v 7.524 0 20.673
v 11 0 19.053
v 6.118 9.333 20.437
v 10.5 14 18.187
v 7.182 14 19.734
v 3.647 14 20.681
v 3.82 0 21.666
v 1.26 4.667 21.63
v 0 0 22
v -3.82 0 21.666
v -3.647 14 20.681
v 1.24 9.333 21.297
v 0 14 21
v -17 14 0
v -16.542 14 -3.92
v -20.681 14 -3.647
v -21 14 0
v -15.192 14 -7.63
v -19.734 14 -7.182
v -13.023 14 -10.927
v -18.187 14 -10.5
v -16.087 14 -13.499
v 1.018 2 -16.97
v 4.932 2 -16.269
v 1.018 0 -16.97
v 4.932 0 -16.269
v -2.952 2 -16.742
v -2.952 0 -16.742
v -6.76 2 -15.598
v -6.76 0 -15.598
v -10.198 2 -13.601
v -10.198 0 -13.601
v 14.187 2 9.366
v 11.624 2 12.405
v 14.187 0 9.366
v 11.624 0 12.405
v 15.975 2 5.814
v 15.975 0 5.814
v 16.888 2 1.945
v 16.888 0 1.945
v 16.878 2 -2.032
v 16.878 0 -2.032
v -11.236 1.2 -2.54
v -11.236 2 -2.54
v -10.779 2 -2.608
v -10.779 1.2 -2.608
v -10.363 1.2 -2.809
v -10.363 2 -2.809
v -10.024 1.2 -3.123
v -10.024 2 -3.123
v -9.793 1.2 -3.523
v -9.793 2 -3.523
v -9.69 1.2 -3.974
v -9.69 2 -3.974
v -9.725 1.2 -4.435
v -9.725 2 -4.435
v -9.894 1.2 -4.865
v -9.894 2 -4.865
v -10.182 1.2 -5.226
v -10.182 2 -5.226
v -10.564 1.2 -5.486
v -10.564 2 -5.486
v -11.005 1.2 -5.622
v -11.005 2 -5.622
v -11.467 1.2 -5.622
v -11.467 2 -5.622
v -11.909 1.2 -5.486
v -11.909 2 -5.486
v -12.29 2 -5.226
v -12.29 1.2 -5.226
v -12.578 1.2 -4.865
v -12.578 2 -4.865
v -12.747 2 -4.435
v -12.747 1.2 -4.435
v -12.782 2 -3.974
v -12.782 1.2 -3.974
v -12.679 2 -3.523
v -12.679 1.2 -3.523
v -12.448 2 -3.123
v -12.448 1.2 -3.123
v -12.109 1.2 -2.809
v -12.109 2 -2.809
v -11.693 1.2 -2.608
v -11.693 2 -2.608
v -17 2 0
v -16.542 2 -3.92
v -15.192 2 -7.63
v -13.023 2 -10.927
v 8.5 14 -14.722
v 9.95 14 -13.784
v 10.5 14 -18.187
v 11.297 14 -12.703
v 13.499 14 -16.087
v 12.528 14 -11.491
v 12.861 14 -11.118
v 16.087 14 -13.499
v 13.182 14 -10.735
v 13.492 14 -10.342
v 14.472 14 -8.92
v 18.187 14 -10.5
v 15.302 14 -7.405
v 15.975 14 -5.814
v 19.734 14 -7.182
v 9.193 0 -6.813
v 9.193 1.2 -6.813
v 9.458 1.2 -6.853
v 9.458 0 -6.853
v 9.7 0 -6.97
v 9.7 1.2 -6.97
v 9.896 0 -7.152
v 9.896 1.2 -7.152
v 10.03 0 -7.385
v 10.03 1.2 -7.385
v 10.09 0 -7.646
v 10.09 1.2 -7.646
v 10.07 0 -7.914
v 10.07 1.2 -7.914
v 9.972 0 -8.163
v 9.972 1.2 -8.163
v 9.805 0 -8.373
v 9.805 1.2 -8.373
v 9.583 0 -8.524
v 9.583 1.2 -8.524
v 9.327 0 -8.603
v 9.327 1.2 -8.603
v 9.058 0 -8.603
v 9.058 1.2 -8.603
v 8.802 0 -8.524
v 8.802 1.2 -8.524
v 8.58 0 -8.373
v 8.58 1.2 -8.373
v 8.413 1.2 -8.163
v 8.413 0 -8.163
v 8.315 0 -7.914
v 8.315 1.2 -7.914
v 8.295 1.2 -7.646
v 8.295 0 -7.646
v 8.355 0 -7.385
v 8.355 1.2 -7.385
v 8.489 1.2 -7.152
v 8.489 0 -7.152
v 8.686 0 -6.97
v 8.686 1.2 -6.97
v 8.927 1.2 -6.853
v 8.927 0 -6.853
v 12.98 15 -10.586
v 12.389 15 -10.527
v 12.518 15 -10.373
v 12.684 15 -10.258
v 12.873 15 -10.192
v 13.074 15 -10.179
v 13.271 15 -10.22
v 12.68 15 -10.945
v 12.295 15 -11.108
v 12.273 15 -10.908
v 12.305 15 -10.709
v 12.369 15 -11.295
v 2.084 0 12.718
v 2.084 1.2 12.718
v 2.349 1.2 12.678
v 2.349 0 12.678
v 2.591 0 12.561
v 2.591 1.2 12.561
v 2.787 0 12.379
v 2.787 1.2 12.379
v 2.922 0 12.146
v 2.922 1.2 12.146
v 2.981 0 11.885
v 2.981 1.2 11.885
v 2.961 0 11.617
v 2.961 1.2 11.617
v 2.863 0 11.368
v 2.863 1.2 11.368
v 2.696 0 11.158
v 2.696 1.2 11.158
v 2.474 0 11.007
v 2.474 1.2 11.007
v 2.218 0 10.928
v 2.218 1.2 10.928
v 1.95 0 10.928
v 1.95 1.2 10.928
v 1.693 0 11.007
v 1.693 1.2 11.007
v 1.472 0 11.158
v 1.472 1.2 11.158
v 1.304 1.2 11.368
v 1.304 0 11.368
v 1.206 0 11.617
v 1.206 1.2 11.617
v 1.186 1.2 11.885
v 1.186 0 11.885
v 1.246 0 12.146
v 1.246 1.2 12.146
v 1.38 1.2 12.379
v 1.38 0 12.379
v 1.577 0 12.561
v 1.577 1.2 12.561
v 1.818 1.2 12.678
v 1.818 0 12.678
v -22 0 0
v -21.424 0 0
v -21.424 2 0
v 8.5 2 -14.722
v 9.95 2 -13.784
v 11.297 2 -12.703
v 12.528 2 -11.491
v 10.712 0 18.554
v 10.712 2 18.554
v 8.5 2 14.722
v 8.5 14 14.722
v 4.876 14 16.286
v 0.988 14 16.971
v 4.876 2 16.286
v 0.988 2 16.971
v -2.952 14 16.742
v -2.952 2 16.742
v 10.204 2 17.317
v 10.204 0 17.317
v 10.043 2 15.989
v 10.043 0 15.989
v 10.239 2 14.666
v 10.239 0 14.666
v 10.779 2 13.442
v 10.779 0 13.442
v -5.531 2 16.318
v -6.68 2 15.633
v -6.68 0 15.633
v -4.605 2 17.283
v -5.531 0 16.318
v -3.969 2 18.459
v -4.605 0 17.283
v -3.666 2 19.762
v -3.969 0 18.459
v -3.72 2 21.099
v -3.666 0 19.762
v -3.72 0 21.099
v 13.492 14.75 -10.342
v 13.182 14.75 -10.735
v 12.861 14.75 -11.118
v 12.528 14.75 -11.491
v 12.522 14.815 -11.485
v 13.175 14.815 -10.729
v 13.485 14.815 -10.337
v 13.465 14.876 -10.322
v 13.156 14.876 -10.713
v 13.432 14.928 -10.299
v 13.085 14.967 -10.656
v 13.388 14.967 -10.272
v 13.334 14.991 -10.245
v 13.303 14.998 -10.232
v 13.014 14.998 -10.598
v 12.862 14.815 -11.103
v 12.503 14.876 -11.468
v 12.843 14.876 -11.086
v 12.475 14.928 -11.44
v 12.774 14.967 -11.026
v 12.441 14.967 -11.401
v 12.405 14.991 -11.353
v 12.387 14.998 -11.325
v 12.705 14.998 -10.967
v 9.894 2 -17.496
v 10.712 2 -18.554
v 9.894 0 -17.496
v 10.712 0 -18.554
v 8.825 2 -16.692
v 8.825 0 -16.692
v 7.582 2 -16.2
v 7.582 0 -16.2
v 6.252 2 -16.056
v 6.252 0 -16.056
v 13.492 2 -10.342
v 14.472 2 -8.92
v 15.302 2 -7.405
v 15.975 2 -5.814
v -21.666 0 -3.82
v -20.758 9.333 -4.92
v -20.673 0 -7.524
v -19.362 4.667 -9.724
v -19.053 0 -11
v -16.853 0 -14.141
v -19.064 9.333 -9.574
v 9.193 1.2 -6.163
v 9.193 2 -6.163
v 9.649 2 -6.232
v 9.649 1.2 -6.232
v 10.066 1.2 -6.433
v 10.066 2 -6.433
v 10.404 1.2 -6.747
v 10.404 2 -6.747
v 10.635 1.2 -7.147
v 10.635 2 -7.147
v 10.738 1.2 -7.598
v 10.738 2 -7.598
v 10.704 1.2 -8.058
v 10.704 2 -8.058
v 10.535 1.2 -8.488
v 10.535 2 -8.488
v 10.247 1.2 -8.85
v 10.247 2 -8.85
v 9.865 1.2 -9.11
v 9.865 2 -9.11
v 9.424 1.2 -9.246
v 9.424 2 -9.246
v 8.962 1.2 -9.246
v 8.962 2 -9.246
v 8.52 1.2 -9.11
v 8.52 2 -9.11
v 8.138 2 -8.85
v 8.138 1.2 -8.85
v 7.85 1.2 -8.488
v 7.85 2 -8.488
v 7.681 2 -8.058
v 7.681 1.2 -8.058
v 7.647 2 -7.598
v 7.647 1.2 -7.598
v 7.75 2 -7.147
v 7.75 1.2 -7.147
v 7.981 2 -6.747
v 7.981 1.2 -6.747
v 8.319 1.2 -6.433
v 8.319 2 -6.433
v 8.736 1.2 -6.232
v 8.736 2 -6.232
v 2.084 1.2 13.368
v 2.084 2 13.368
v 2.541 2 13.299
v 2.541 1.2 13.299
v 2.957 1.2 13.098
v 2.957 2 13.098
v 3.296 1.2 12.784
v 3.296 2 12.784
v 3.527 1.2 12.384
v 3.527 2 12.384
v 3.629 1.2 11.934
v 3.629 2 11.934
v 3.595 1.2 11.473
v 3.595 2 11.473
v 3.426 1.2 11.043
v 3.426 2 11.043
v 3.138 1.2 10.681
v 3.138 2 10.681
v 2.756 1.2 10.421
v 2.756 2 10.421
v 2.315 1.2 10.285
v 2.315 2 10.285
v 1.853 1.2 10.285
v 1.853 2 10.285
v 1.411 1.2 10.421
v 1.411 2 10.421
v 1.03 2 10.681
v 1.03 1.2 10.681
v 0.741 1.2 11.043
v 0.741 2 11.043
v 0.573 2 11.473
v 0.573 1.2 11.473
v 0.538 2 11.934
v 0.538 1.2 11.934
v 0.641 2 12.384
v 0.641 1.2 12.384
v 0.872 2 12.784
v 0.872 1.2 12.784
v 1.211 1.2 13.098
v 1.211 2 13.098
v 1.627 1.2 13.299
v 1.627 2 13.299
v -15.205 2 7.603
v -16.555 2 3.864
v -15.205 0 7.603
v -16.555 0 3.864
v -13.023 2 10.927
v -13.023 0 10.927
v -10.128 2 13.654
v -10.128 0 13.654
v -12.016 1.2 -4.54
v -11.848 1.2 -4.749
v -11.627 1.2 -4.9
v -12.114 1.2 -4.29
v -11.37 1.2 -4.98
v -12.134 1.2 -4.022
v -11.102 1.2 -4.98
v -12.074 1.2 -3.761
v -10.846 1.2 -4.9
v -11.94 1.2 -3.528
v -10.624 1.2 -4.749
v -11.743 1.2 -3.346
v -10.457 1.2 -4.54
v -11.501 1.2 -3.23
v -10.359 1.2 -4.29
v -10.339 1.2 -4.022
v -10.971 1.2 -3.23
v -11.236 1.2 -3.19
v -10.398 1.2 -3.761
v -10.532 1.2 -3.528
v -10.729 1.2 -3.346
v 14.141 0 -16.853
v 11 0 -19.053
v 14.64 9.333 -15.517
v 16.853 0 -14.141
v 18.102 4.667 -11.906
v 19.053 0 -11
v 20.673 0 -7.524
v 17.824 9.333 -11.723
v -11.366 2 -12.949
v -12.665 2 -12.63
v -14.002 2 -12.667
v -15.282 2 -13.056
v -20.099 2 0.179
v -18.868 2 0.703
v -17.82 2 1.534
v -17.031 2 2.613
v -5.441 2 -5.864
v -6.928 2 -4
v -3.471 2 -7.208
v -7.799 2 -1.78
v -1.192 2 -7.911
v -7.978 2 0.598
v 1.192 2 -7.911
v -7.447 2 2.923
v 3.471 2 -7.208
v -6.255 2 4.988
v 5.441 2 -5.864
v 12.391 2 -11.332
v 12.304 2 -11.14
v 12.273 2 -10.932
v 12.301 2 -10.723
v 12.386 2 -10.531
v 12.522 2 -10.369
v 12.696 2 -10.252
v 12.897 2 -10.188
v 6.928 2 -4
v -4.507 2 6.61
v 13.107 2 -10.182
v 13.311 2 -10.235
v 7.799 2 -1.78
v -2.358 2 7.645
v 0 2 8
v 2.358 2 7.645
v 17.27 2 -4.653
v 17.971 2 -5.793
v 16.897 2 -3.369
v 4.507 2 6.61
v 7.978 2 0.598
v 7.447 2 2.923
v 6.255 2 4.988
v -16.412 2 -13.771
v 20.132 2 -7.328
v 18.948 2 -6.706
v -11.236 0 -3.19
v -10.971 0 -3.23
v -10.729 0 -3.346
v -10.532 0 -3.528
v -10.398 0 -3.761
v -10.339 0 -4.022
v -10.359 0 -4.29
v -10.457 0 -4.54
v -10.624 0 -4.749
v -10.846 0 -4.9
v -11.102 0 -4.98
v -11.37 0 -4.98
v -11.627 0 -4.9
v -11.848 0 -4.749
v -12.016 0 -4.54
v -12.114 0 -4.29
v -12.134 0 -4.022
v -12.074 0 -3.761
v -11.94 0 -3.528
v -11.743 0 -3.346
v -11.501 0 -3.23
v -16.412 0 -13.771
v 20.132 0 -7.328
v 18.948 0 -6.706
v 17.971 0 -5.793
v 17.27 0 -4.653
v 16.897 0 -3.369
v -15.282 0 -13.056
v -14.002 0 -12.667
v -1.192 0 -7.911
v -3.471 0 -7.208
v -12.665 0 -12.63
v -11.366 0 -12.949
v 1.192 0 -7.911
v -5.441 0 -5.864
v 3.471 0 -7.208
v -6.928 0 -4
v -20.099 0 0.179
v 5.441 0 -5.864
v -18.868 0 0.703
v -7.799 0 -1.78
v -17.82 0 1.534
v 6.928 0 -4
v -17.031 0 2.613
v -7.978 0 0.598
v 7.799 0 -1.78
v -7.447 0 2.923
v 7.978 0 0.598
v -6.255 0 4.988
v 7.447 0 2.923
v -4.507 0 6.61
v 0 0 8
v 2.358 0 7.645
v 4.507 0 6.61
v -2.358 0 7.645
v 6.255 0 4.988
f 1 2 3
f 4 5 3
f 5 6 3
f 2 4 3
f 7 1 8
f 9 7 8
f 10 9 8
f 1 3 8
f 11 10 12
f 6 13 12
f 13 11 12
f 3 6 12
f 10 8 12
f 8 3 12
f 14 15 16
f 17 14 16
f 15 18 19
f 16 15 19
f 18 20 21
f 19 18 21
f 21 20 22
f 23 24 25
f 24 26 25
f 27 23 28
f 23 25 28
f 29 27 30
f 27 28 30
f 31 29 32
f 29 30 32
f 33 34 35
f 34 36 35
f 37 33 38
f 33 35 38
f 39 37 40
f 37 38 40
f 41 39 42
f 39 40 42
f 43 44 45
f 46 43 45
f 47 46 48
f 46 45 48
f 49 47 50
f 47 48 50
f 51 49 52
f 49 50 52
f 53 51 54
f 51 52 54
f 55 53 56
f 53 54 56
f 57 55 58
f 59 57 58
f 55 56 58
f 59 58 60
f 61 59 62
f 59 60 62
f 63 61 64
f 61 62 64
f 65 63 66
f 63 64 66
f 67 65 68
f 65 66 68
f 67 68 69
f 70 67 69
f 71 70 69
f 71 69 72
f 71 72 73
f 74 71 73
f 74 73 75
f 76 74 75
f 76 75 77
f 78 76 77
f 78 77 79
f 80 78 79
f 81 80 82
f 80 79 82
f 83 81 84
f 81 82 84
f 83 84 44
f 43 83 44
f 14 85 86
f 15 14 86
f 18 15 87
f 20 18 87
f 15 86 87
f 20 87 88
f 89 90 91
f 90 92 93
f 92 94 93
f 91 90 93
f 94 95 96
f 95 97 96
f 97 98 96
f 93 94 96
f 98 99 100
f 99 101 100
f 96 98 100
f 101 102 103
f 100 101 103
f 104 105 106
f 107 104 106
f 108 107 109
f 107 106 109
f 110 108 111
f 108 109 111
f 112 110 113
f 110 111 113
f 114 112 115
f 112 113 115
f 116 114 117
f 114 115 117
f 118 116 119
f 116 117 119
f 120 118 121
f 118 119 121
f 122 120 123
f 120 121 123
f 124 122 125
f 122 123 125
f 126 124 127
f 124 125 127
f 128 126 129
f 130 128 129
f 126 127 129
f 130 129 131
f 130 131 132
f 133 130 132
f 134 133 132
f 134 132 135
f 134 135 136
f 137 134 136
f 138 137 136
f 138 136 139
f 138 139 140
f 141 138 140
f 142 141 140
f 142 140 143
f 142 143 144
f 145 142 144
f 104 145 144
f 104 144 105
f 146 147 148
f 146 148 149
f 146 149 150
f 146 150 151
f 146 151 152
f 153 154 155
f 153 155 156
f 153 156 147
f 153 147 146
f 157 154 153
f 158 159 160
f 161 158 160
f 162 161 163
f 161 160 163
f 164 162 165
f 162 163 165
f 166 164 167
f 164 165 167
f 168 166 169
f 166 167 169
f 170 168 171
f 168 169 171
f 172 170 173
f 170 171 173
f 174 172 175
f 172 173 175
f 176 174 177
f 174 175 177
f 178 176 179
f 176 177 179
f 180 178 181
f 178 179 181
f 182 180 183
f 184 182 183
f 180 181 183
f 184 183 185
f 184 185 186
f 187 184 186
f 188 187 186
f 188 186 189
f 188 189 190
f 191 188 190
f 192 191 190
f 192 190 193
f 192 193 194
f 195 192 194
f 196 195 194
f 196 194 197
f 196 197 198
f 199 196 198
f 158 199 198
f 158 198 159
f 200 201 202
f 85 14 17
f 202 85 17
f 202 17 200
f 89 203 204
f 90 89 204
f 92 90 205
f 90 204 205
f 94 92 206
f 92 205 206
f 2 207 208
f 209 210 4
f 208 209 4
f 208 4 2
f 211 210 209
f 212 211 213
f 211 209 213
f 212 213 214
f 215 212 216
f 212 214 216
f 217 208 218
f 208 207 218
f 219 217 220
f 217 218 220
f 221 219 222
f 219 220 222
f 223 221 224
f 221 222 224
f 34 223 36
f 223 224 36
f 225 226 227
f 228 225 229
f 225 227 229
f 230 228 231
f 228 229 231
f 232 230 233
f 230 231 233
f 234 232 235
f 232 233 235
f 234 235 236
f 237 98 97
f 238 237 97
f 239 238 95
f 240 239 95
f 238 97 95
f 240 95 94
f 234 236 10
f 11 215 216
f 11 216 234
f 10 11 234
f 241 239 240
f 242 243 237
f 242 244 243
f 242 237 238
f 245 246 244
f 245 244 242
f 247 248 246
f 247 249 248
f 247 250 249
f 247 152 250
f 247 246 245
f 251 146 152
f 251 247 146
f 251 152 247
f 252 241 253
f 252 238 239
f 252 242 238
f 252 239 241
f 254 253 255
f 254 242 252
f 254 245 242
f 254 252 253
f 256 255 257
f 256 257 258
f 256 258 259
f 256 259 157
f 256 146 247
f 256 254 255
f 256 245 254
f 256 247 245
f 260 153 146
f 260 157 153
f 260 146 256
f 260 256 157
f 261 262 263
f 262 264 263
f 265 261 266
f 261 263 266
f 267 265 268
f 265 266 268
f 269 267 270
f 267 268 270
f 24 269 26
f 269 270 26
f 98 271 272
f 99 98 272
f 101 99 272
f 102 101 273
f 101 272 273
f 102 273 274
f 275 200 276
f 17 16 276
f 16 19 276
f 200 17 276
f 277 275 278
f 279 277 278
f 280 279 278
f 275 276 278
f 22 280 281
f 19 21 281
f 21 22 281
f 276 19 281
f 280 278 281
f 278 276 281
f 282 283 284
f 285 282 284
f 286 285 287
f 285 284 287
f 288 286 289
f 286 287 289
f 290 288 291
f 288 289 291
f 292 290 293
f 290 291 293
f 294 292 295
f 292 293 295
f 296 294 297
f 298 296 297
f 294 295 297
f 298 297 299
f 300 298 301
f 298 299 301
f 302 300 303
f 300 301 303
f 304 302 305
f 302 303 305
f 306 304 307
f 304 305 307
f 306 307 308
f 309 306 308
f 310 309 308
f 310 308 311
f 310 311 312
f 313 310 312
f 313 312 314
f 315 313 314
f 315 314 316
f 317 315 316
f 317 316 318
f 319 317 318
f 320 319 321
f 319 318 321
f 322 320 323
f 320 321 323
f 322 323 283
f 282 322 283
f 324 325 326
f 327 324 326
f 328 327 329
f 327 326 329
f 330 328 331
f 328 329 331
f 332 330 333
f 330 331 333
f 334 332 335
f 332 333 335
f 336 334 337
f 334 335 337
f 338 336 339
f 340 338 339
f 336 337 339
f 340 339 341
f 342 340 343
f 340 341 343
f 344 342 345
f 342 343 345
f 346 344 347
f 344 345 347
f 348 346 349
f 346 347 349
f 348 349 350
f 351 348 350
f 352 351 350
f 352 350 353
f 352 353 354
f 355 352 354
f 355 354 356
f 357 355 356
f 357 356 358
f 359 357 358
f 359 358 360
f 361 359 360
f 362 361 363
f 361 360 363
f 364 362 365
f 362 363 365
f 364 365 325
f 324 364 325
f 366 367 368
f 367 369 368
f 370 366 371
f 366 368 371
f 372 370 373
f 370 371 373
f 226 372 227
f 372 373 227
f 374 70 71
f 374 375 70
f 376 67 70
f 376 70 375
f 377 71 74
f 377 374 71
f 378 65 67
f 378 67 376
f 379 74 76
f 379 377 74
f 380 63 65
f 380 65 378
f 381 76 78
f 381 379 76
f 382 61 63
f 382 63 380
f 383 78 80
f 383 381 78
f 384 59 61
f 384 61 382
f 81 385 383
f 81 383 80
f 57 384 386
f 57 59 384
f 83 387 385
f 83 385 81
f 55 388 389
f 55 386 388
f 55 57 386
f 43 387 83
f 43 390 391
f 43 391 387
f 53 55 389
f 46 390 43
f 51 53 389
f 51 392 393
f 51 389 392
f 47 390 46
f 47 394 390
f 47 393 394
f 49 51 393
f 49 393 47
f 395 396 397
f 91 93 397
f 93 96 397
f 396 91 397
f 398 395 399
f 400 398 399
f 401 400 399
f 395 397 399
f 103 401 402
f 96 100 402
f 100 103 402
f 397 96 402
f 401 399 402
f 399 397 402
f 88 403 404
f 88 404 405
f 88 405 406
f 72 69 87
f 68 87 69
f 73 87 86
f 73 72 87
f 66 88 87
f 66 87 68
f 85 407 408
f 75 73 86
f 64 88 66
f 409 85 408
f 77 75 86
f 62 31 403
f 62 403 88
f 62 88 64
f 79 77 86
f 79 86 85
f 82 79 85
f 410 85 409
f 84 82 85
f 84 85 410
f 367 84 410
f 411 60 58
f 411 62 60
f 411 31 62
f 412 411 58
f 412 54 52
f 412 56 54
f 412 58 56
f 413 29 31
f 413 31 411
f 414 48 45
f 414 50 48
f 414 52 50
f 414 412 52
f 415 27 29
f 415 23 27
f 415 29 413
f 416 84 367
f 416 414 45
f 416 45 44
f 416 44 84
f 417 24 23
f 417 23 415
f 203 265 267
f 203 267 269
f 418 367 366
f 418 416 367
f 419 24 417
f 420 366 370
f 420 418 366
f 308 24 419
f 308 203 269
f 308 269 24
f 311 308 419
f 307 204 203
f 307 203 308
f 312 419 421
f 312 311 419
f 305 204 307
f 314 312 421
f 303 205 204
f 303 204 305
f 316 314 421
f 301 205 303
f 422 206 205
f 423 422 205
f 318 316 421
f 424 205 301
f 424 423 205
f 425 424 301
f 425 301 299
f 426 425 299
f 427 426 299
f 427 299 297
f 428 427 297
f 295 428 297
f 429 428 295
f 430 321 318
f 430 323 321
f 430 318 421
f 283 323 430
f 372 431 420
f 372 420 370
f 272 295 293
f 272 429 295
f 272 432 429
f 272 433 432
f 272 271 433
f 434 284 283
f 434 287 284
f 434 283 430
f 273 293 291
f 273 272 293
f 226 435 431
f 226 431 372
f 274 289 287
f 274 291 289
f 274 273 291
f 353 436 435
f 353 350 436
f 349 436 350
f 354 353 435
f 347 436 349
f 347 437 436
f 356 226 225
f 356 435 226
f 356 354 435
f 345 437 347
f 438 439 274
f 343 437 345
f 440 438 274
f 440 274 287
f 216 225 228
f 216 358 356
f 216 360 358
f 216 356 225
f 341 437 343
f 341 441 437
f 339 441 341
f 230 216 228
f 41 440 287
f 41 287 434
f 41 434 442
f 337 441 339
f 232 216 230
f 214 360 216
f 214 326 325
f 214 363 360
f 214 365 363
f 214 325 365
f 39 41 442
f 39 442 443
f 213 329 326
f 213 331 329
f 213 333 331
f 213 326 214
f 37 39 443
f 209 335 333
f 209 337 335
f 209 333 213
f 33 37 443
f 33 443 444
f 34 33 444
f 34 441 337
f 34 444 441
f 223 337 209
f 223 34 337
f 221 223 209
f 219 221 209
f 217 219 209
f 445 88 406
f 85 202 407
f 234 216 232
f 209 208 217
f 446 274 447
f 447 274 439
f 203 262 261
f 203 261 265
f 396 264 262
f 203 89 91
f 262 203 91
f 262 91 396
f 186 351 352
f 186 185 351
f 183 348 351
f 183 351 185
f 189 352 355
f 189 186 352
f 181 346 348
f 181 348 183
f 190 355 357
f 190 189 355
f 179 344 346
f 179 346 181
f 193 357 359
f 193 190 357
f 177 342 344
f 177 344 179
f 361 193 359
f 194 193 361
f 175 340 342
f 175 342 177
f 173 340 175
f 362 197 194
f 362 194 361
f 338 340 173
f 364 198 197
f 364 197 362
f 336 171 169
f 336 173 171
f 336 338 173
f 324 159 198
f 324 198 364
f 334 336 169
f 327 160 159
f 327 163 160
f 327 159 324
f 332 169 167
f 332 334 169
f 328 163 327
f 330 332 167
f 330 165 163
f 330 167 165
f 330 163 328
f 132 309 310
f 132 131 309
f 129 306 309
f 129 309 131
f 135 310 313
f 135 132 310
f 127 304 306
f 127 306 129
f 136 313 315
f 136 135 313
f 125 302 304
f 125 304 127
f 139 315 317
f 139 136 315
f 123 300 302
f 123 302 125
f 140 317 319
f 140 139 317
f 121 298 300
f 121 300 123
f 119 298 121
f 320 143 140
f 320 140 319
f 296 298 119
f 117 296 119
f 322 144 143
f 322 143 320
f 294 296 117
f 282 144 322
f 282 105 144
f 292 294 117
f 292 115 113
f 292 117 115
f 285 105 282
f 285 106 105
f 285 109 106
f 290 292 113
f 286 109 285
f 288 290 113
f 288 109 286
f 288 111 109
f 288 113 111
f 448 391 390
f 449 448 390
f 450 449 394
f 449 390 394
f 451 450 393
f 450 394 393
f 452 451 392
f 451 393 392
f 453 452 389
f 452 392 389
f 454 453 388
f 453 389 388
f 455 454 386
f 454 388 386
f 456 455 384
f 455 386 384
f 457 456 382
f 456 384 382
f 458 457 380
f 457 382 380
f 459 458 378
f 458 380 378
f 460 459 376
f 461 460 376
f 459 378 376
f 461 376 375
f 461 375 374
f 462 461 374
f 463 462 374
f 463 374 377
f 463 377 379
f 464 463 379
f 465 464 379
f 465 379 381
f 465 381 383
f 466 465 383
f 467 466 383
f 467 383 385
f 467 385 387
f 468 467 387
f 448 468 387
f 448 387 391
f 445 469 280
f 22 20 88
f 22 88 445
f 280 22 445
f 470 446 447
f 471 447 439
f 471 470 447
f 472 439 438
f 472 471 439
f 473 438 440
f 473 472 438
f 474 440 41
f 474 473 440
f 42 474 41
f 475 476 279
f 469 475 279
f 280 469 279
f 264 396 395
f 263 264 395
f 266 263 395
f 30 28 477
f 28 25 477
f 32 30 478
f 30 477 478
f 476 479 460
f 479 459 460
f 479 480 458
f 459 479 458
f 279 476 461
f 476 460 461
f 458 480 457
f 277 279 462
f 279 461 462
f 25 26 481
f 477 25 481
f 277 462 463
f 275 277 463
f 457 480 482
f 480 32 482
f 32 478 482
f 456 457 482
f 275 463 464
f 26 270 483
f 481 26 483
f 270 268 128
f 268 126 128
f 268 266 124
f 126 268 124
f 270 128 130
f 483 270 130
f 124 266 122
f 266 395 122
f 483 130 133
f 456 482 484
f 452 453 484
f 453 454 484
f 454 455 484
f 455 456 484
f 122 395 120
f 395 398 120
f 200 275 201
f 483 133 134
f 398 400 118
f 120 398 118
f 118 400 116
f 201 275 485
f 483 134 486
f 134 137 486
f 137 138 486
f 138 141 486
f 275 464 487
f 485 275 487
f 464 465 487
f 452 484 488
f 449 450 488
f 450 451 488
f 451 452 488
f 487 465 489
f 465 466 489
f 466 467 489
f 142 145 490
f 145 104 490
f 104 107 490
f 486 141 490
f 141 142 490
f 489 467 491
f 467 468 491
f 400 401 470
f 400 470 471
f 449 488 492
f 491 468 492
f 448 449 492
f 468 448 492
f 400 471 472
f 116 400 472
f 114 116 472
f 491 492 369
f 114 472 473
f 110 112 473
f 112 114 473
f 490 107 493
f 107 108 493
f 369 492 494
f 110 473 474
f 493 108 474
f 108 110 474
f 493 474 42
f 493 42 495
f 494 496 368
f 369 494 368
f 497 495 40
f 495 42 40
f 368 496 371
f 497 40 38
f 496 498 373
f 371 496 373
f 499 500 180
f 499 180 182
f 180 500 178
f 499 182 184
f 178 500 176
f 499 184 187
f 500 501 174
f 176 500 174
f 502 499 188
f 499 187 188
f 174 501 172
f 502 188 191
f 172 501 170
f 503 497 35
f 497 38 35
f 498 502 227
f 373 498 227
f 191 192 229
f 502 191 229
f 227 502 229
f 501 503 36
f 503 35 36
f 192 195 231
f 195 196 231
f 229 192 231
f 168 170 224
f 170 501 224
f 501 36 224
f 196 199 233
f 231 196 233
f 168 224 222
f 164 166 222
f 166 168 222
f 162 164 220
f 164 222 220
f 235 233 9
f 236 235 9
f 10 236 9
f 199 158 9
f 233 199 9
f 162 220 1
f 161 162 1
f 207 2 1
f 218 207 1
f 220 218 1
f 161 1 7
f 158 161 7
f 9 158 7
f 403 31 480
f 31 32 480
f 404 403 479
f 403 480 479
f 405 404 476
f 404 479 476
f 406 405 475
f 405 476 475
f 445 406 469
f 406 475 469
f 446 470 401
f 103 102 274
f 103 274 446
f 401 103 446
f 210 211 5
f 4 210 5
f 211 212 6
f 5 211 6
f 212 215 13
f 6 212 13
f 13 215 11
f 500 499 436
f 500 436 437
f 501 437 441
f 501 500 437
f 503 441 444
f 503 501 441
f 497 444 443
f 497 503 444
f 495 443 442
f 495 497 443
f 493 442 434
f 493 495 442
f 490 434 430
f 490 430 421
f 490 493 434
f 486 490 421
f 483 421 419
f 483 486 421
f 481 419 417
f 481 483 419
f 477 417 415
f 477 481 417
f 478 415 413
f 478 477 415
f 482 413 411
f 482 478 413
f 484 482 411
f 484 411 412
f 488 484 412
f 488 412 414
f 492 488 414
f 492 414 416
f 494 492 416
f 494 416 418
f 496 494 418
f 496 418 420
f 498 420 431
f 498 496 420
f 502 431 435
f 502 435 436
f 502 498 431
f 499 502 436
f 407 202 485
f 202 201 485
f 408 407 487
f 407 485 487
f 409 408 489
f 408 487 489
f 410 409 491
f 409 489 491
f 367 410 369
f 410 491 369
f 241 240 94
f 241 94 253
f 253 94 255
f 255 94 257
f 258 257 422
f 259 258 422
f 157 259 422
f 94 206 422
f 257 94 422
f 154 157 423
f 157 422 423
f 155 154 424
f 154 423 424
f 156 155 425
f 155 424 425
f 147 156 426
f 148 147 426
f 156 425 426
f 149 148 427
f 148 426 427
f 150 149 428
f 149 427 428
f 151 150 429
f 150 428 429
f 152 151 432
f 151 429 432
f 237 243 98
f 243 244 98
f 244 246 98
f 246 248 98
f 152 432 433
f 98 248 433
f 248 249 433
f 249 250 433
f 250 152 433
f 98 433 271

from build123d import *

# Parameters (mm, degrees)
SKETCH1_R           = 17
SKETCH1_R_2         = 8
BOSS_EXTRUDE4_DEPTH = 2
REVOLVE2_ANGLE      = 40
CIRPATTERN1_COUNT   = 3
FILLET1_R           = 5
BOSS_EXTRUDE6_DEPTH = 13
FILLET2_R           = 0.25
SKETCH25_R          = 0.9
CUT_EXTRUDE1_DEPTH  = 34.719430639
SKETCH26_R          = 1.55
CUT_EXTRUDE2_DEPTH  = 0.8


with BuildPart() as part:
    # Sketch1 → Boss-Extrude4 (new body)
    with BuildSketch(Plane(origin=(0, 0, 0), x_dir=(1, 0, 0), z_dir=(0, 1, 0))):
        with Locations(Location((0, 0, 0), (0, 0, 270))):
            Circle(SKETCH1_R)
        with Locations(Location((0, 0, 0), (0, 0, 270))):
            Circle(SKETCH1_R_2, mode=Mode.SUBTRACT)
    extrude(amount=BOSS_EXTRUDE4_DEPTH)

    # Sketch5 → Revolve2 (revolve)
    with BuildSketch(Plane.XY):
        Polygon((-17, 0), (-22, 0), (-21, 14), (-17, 14), align=None)
    revolve2 = revolve(axis=Axis((0, 9.813682869, 0), (0, -1, 0)), revolution_arc=REVOLVE2_ANGLE)

    # CirPattern1: Revolve2 ×3 about axis
    cirpattern1_axis = Axis((0, 0, 0), (0, 1, 0))
    for i in range(1, CIRPATTERN1_COUNT):
        add(revolve2.rotate(cirpattern1_axis, i * 360 / CIRPATTERN1_COUNT))

    # Fillet1
    fillet1_edges = [part.edges().sort_by_distance(p)[0] for p in [
        (-13.022755533, 1, -10.927389365),
        (-17, 1, 0),
        (-2.95201902, 1, 16.741731801),
        (8.5, 1, 14.722431864),
        (15.974774553, 1, -5.814342437),
        (8.5, 1, -14.722431864),
    ]]
    fillet(fillet1_edges, radius=FILLET1_R)

    # Sketch24 → Boss-Extrude6 (add)
    with BuildSketch(Plane(origin=(0, 2, 0), x_dir=(1, 0, 0), z_dir=(0, 1, 0))):
        with BuildLine():
            ThreePointArc((12.528097784, 11.491160338), (12.448209945, 10.445288373), (13.492065142, 10.342348776))
            ThreePointArc((13.492065142, 10.342348776), (13.022755533, 10.927389365), (12.528097784, 11.491160338))
        make_face()
    extrude(amount=BOSS_EXTRUDE6_DEPTH)

    # Fillet2
    # the kernel refuses this fillet: 0.25 mm, written as the material it takes off along each edge
    with BuildSketch(Plane(origin=(0, 15, 0), x_dir=(0.8154762444384231, 0, -0.578790544805809), z_dir=(0.578790544805809, 0, 0.8154762444384231))) as fillet2_piece_1:
        with BuildLine():
            CenterArc((17 - FILLET2_R, -FILLET2_R), FILLET2_R, 0, 90)
            Line((17 - FILLET2_R, 0), (17, 0))
            Line((17, 0), (17, -FILLET2_R))
        make_face()
    revolve(axis=Axis((0, 15, 0), (0, 1, 0)), revolution_arc=9.268958216, mode=Mode.SUBTRACT)

    # Sketch25 → Cut-Extrude1 (cut, through all)
    with BuildSketch(Plane(origin=(0, 2, 0), x_dir=(1, 0, 0), z_dir=(0, 1, 0))):
        with Locations(Location((2.083778132, -11.817693036, 0), (0, 0, 270))):
            Circle(SKETCH25_R)
        with Locations(Location((-11.236091343, 4.089602798, 0), (0, 0, 270))):
            Circle(SKETCH25_R)
        with Locations(Location((9.192533317, 7.713451316, 0), (0, 0, 270))):
            Circle(SKETCH25_R)
    extrude(amount=-CUT_EXTRUDE1_DEPTH, mode=Mode.SUBTRACT)

    # Sketch26 → Cut-Extrude2 (cut)
    with BuildSketch(Plane(origin=(0, 2, 0), x_dir=(1, 0, 0), z_dir=(0, 1, 0))):
        with Locations(Location((2.083778132, -11.817693036, 0), (0, 0, 270))):
            Circle(SKETCH26_R)
        with Locations(Location((-11.236091343, 4.089602798, 0), (0, 0, 270))):
            Circle(SKETCH26_R)
        with Locations(Location((9.192533317, 7.713451316, 0), (0, 0, 270))):
            Circle(SKETCH26_R)
    extrude(amount=-CUT_EXTRUDE2_DEPTH, mode=Mode.SUBTRACT)


solid = part.part
